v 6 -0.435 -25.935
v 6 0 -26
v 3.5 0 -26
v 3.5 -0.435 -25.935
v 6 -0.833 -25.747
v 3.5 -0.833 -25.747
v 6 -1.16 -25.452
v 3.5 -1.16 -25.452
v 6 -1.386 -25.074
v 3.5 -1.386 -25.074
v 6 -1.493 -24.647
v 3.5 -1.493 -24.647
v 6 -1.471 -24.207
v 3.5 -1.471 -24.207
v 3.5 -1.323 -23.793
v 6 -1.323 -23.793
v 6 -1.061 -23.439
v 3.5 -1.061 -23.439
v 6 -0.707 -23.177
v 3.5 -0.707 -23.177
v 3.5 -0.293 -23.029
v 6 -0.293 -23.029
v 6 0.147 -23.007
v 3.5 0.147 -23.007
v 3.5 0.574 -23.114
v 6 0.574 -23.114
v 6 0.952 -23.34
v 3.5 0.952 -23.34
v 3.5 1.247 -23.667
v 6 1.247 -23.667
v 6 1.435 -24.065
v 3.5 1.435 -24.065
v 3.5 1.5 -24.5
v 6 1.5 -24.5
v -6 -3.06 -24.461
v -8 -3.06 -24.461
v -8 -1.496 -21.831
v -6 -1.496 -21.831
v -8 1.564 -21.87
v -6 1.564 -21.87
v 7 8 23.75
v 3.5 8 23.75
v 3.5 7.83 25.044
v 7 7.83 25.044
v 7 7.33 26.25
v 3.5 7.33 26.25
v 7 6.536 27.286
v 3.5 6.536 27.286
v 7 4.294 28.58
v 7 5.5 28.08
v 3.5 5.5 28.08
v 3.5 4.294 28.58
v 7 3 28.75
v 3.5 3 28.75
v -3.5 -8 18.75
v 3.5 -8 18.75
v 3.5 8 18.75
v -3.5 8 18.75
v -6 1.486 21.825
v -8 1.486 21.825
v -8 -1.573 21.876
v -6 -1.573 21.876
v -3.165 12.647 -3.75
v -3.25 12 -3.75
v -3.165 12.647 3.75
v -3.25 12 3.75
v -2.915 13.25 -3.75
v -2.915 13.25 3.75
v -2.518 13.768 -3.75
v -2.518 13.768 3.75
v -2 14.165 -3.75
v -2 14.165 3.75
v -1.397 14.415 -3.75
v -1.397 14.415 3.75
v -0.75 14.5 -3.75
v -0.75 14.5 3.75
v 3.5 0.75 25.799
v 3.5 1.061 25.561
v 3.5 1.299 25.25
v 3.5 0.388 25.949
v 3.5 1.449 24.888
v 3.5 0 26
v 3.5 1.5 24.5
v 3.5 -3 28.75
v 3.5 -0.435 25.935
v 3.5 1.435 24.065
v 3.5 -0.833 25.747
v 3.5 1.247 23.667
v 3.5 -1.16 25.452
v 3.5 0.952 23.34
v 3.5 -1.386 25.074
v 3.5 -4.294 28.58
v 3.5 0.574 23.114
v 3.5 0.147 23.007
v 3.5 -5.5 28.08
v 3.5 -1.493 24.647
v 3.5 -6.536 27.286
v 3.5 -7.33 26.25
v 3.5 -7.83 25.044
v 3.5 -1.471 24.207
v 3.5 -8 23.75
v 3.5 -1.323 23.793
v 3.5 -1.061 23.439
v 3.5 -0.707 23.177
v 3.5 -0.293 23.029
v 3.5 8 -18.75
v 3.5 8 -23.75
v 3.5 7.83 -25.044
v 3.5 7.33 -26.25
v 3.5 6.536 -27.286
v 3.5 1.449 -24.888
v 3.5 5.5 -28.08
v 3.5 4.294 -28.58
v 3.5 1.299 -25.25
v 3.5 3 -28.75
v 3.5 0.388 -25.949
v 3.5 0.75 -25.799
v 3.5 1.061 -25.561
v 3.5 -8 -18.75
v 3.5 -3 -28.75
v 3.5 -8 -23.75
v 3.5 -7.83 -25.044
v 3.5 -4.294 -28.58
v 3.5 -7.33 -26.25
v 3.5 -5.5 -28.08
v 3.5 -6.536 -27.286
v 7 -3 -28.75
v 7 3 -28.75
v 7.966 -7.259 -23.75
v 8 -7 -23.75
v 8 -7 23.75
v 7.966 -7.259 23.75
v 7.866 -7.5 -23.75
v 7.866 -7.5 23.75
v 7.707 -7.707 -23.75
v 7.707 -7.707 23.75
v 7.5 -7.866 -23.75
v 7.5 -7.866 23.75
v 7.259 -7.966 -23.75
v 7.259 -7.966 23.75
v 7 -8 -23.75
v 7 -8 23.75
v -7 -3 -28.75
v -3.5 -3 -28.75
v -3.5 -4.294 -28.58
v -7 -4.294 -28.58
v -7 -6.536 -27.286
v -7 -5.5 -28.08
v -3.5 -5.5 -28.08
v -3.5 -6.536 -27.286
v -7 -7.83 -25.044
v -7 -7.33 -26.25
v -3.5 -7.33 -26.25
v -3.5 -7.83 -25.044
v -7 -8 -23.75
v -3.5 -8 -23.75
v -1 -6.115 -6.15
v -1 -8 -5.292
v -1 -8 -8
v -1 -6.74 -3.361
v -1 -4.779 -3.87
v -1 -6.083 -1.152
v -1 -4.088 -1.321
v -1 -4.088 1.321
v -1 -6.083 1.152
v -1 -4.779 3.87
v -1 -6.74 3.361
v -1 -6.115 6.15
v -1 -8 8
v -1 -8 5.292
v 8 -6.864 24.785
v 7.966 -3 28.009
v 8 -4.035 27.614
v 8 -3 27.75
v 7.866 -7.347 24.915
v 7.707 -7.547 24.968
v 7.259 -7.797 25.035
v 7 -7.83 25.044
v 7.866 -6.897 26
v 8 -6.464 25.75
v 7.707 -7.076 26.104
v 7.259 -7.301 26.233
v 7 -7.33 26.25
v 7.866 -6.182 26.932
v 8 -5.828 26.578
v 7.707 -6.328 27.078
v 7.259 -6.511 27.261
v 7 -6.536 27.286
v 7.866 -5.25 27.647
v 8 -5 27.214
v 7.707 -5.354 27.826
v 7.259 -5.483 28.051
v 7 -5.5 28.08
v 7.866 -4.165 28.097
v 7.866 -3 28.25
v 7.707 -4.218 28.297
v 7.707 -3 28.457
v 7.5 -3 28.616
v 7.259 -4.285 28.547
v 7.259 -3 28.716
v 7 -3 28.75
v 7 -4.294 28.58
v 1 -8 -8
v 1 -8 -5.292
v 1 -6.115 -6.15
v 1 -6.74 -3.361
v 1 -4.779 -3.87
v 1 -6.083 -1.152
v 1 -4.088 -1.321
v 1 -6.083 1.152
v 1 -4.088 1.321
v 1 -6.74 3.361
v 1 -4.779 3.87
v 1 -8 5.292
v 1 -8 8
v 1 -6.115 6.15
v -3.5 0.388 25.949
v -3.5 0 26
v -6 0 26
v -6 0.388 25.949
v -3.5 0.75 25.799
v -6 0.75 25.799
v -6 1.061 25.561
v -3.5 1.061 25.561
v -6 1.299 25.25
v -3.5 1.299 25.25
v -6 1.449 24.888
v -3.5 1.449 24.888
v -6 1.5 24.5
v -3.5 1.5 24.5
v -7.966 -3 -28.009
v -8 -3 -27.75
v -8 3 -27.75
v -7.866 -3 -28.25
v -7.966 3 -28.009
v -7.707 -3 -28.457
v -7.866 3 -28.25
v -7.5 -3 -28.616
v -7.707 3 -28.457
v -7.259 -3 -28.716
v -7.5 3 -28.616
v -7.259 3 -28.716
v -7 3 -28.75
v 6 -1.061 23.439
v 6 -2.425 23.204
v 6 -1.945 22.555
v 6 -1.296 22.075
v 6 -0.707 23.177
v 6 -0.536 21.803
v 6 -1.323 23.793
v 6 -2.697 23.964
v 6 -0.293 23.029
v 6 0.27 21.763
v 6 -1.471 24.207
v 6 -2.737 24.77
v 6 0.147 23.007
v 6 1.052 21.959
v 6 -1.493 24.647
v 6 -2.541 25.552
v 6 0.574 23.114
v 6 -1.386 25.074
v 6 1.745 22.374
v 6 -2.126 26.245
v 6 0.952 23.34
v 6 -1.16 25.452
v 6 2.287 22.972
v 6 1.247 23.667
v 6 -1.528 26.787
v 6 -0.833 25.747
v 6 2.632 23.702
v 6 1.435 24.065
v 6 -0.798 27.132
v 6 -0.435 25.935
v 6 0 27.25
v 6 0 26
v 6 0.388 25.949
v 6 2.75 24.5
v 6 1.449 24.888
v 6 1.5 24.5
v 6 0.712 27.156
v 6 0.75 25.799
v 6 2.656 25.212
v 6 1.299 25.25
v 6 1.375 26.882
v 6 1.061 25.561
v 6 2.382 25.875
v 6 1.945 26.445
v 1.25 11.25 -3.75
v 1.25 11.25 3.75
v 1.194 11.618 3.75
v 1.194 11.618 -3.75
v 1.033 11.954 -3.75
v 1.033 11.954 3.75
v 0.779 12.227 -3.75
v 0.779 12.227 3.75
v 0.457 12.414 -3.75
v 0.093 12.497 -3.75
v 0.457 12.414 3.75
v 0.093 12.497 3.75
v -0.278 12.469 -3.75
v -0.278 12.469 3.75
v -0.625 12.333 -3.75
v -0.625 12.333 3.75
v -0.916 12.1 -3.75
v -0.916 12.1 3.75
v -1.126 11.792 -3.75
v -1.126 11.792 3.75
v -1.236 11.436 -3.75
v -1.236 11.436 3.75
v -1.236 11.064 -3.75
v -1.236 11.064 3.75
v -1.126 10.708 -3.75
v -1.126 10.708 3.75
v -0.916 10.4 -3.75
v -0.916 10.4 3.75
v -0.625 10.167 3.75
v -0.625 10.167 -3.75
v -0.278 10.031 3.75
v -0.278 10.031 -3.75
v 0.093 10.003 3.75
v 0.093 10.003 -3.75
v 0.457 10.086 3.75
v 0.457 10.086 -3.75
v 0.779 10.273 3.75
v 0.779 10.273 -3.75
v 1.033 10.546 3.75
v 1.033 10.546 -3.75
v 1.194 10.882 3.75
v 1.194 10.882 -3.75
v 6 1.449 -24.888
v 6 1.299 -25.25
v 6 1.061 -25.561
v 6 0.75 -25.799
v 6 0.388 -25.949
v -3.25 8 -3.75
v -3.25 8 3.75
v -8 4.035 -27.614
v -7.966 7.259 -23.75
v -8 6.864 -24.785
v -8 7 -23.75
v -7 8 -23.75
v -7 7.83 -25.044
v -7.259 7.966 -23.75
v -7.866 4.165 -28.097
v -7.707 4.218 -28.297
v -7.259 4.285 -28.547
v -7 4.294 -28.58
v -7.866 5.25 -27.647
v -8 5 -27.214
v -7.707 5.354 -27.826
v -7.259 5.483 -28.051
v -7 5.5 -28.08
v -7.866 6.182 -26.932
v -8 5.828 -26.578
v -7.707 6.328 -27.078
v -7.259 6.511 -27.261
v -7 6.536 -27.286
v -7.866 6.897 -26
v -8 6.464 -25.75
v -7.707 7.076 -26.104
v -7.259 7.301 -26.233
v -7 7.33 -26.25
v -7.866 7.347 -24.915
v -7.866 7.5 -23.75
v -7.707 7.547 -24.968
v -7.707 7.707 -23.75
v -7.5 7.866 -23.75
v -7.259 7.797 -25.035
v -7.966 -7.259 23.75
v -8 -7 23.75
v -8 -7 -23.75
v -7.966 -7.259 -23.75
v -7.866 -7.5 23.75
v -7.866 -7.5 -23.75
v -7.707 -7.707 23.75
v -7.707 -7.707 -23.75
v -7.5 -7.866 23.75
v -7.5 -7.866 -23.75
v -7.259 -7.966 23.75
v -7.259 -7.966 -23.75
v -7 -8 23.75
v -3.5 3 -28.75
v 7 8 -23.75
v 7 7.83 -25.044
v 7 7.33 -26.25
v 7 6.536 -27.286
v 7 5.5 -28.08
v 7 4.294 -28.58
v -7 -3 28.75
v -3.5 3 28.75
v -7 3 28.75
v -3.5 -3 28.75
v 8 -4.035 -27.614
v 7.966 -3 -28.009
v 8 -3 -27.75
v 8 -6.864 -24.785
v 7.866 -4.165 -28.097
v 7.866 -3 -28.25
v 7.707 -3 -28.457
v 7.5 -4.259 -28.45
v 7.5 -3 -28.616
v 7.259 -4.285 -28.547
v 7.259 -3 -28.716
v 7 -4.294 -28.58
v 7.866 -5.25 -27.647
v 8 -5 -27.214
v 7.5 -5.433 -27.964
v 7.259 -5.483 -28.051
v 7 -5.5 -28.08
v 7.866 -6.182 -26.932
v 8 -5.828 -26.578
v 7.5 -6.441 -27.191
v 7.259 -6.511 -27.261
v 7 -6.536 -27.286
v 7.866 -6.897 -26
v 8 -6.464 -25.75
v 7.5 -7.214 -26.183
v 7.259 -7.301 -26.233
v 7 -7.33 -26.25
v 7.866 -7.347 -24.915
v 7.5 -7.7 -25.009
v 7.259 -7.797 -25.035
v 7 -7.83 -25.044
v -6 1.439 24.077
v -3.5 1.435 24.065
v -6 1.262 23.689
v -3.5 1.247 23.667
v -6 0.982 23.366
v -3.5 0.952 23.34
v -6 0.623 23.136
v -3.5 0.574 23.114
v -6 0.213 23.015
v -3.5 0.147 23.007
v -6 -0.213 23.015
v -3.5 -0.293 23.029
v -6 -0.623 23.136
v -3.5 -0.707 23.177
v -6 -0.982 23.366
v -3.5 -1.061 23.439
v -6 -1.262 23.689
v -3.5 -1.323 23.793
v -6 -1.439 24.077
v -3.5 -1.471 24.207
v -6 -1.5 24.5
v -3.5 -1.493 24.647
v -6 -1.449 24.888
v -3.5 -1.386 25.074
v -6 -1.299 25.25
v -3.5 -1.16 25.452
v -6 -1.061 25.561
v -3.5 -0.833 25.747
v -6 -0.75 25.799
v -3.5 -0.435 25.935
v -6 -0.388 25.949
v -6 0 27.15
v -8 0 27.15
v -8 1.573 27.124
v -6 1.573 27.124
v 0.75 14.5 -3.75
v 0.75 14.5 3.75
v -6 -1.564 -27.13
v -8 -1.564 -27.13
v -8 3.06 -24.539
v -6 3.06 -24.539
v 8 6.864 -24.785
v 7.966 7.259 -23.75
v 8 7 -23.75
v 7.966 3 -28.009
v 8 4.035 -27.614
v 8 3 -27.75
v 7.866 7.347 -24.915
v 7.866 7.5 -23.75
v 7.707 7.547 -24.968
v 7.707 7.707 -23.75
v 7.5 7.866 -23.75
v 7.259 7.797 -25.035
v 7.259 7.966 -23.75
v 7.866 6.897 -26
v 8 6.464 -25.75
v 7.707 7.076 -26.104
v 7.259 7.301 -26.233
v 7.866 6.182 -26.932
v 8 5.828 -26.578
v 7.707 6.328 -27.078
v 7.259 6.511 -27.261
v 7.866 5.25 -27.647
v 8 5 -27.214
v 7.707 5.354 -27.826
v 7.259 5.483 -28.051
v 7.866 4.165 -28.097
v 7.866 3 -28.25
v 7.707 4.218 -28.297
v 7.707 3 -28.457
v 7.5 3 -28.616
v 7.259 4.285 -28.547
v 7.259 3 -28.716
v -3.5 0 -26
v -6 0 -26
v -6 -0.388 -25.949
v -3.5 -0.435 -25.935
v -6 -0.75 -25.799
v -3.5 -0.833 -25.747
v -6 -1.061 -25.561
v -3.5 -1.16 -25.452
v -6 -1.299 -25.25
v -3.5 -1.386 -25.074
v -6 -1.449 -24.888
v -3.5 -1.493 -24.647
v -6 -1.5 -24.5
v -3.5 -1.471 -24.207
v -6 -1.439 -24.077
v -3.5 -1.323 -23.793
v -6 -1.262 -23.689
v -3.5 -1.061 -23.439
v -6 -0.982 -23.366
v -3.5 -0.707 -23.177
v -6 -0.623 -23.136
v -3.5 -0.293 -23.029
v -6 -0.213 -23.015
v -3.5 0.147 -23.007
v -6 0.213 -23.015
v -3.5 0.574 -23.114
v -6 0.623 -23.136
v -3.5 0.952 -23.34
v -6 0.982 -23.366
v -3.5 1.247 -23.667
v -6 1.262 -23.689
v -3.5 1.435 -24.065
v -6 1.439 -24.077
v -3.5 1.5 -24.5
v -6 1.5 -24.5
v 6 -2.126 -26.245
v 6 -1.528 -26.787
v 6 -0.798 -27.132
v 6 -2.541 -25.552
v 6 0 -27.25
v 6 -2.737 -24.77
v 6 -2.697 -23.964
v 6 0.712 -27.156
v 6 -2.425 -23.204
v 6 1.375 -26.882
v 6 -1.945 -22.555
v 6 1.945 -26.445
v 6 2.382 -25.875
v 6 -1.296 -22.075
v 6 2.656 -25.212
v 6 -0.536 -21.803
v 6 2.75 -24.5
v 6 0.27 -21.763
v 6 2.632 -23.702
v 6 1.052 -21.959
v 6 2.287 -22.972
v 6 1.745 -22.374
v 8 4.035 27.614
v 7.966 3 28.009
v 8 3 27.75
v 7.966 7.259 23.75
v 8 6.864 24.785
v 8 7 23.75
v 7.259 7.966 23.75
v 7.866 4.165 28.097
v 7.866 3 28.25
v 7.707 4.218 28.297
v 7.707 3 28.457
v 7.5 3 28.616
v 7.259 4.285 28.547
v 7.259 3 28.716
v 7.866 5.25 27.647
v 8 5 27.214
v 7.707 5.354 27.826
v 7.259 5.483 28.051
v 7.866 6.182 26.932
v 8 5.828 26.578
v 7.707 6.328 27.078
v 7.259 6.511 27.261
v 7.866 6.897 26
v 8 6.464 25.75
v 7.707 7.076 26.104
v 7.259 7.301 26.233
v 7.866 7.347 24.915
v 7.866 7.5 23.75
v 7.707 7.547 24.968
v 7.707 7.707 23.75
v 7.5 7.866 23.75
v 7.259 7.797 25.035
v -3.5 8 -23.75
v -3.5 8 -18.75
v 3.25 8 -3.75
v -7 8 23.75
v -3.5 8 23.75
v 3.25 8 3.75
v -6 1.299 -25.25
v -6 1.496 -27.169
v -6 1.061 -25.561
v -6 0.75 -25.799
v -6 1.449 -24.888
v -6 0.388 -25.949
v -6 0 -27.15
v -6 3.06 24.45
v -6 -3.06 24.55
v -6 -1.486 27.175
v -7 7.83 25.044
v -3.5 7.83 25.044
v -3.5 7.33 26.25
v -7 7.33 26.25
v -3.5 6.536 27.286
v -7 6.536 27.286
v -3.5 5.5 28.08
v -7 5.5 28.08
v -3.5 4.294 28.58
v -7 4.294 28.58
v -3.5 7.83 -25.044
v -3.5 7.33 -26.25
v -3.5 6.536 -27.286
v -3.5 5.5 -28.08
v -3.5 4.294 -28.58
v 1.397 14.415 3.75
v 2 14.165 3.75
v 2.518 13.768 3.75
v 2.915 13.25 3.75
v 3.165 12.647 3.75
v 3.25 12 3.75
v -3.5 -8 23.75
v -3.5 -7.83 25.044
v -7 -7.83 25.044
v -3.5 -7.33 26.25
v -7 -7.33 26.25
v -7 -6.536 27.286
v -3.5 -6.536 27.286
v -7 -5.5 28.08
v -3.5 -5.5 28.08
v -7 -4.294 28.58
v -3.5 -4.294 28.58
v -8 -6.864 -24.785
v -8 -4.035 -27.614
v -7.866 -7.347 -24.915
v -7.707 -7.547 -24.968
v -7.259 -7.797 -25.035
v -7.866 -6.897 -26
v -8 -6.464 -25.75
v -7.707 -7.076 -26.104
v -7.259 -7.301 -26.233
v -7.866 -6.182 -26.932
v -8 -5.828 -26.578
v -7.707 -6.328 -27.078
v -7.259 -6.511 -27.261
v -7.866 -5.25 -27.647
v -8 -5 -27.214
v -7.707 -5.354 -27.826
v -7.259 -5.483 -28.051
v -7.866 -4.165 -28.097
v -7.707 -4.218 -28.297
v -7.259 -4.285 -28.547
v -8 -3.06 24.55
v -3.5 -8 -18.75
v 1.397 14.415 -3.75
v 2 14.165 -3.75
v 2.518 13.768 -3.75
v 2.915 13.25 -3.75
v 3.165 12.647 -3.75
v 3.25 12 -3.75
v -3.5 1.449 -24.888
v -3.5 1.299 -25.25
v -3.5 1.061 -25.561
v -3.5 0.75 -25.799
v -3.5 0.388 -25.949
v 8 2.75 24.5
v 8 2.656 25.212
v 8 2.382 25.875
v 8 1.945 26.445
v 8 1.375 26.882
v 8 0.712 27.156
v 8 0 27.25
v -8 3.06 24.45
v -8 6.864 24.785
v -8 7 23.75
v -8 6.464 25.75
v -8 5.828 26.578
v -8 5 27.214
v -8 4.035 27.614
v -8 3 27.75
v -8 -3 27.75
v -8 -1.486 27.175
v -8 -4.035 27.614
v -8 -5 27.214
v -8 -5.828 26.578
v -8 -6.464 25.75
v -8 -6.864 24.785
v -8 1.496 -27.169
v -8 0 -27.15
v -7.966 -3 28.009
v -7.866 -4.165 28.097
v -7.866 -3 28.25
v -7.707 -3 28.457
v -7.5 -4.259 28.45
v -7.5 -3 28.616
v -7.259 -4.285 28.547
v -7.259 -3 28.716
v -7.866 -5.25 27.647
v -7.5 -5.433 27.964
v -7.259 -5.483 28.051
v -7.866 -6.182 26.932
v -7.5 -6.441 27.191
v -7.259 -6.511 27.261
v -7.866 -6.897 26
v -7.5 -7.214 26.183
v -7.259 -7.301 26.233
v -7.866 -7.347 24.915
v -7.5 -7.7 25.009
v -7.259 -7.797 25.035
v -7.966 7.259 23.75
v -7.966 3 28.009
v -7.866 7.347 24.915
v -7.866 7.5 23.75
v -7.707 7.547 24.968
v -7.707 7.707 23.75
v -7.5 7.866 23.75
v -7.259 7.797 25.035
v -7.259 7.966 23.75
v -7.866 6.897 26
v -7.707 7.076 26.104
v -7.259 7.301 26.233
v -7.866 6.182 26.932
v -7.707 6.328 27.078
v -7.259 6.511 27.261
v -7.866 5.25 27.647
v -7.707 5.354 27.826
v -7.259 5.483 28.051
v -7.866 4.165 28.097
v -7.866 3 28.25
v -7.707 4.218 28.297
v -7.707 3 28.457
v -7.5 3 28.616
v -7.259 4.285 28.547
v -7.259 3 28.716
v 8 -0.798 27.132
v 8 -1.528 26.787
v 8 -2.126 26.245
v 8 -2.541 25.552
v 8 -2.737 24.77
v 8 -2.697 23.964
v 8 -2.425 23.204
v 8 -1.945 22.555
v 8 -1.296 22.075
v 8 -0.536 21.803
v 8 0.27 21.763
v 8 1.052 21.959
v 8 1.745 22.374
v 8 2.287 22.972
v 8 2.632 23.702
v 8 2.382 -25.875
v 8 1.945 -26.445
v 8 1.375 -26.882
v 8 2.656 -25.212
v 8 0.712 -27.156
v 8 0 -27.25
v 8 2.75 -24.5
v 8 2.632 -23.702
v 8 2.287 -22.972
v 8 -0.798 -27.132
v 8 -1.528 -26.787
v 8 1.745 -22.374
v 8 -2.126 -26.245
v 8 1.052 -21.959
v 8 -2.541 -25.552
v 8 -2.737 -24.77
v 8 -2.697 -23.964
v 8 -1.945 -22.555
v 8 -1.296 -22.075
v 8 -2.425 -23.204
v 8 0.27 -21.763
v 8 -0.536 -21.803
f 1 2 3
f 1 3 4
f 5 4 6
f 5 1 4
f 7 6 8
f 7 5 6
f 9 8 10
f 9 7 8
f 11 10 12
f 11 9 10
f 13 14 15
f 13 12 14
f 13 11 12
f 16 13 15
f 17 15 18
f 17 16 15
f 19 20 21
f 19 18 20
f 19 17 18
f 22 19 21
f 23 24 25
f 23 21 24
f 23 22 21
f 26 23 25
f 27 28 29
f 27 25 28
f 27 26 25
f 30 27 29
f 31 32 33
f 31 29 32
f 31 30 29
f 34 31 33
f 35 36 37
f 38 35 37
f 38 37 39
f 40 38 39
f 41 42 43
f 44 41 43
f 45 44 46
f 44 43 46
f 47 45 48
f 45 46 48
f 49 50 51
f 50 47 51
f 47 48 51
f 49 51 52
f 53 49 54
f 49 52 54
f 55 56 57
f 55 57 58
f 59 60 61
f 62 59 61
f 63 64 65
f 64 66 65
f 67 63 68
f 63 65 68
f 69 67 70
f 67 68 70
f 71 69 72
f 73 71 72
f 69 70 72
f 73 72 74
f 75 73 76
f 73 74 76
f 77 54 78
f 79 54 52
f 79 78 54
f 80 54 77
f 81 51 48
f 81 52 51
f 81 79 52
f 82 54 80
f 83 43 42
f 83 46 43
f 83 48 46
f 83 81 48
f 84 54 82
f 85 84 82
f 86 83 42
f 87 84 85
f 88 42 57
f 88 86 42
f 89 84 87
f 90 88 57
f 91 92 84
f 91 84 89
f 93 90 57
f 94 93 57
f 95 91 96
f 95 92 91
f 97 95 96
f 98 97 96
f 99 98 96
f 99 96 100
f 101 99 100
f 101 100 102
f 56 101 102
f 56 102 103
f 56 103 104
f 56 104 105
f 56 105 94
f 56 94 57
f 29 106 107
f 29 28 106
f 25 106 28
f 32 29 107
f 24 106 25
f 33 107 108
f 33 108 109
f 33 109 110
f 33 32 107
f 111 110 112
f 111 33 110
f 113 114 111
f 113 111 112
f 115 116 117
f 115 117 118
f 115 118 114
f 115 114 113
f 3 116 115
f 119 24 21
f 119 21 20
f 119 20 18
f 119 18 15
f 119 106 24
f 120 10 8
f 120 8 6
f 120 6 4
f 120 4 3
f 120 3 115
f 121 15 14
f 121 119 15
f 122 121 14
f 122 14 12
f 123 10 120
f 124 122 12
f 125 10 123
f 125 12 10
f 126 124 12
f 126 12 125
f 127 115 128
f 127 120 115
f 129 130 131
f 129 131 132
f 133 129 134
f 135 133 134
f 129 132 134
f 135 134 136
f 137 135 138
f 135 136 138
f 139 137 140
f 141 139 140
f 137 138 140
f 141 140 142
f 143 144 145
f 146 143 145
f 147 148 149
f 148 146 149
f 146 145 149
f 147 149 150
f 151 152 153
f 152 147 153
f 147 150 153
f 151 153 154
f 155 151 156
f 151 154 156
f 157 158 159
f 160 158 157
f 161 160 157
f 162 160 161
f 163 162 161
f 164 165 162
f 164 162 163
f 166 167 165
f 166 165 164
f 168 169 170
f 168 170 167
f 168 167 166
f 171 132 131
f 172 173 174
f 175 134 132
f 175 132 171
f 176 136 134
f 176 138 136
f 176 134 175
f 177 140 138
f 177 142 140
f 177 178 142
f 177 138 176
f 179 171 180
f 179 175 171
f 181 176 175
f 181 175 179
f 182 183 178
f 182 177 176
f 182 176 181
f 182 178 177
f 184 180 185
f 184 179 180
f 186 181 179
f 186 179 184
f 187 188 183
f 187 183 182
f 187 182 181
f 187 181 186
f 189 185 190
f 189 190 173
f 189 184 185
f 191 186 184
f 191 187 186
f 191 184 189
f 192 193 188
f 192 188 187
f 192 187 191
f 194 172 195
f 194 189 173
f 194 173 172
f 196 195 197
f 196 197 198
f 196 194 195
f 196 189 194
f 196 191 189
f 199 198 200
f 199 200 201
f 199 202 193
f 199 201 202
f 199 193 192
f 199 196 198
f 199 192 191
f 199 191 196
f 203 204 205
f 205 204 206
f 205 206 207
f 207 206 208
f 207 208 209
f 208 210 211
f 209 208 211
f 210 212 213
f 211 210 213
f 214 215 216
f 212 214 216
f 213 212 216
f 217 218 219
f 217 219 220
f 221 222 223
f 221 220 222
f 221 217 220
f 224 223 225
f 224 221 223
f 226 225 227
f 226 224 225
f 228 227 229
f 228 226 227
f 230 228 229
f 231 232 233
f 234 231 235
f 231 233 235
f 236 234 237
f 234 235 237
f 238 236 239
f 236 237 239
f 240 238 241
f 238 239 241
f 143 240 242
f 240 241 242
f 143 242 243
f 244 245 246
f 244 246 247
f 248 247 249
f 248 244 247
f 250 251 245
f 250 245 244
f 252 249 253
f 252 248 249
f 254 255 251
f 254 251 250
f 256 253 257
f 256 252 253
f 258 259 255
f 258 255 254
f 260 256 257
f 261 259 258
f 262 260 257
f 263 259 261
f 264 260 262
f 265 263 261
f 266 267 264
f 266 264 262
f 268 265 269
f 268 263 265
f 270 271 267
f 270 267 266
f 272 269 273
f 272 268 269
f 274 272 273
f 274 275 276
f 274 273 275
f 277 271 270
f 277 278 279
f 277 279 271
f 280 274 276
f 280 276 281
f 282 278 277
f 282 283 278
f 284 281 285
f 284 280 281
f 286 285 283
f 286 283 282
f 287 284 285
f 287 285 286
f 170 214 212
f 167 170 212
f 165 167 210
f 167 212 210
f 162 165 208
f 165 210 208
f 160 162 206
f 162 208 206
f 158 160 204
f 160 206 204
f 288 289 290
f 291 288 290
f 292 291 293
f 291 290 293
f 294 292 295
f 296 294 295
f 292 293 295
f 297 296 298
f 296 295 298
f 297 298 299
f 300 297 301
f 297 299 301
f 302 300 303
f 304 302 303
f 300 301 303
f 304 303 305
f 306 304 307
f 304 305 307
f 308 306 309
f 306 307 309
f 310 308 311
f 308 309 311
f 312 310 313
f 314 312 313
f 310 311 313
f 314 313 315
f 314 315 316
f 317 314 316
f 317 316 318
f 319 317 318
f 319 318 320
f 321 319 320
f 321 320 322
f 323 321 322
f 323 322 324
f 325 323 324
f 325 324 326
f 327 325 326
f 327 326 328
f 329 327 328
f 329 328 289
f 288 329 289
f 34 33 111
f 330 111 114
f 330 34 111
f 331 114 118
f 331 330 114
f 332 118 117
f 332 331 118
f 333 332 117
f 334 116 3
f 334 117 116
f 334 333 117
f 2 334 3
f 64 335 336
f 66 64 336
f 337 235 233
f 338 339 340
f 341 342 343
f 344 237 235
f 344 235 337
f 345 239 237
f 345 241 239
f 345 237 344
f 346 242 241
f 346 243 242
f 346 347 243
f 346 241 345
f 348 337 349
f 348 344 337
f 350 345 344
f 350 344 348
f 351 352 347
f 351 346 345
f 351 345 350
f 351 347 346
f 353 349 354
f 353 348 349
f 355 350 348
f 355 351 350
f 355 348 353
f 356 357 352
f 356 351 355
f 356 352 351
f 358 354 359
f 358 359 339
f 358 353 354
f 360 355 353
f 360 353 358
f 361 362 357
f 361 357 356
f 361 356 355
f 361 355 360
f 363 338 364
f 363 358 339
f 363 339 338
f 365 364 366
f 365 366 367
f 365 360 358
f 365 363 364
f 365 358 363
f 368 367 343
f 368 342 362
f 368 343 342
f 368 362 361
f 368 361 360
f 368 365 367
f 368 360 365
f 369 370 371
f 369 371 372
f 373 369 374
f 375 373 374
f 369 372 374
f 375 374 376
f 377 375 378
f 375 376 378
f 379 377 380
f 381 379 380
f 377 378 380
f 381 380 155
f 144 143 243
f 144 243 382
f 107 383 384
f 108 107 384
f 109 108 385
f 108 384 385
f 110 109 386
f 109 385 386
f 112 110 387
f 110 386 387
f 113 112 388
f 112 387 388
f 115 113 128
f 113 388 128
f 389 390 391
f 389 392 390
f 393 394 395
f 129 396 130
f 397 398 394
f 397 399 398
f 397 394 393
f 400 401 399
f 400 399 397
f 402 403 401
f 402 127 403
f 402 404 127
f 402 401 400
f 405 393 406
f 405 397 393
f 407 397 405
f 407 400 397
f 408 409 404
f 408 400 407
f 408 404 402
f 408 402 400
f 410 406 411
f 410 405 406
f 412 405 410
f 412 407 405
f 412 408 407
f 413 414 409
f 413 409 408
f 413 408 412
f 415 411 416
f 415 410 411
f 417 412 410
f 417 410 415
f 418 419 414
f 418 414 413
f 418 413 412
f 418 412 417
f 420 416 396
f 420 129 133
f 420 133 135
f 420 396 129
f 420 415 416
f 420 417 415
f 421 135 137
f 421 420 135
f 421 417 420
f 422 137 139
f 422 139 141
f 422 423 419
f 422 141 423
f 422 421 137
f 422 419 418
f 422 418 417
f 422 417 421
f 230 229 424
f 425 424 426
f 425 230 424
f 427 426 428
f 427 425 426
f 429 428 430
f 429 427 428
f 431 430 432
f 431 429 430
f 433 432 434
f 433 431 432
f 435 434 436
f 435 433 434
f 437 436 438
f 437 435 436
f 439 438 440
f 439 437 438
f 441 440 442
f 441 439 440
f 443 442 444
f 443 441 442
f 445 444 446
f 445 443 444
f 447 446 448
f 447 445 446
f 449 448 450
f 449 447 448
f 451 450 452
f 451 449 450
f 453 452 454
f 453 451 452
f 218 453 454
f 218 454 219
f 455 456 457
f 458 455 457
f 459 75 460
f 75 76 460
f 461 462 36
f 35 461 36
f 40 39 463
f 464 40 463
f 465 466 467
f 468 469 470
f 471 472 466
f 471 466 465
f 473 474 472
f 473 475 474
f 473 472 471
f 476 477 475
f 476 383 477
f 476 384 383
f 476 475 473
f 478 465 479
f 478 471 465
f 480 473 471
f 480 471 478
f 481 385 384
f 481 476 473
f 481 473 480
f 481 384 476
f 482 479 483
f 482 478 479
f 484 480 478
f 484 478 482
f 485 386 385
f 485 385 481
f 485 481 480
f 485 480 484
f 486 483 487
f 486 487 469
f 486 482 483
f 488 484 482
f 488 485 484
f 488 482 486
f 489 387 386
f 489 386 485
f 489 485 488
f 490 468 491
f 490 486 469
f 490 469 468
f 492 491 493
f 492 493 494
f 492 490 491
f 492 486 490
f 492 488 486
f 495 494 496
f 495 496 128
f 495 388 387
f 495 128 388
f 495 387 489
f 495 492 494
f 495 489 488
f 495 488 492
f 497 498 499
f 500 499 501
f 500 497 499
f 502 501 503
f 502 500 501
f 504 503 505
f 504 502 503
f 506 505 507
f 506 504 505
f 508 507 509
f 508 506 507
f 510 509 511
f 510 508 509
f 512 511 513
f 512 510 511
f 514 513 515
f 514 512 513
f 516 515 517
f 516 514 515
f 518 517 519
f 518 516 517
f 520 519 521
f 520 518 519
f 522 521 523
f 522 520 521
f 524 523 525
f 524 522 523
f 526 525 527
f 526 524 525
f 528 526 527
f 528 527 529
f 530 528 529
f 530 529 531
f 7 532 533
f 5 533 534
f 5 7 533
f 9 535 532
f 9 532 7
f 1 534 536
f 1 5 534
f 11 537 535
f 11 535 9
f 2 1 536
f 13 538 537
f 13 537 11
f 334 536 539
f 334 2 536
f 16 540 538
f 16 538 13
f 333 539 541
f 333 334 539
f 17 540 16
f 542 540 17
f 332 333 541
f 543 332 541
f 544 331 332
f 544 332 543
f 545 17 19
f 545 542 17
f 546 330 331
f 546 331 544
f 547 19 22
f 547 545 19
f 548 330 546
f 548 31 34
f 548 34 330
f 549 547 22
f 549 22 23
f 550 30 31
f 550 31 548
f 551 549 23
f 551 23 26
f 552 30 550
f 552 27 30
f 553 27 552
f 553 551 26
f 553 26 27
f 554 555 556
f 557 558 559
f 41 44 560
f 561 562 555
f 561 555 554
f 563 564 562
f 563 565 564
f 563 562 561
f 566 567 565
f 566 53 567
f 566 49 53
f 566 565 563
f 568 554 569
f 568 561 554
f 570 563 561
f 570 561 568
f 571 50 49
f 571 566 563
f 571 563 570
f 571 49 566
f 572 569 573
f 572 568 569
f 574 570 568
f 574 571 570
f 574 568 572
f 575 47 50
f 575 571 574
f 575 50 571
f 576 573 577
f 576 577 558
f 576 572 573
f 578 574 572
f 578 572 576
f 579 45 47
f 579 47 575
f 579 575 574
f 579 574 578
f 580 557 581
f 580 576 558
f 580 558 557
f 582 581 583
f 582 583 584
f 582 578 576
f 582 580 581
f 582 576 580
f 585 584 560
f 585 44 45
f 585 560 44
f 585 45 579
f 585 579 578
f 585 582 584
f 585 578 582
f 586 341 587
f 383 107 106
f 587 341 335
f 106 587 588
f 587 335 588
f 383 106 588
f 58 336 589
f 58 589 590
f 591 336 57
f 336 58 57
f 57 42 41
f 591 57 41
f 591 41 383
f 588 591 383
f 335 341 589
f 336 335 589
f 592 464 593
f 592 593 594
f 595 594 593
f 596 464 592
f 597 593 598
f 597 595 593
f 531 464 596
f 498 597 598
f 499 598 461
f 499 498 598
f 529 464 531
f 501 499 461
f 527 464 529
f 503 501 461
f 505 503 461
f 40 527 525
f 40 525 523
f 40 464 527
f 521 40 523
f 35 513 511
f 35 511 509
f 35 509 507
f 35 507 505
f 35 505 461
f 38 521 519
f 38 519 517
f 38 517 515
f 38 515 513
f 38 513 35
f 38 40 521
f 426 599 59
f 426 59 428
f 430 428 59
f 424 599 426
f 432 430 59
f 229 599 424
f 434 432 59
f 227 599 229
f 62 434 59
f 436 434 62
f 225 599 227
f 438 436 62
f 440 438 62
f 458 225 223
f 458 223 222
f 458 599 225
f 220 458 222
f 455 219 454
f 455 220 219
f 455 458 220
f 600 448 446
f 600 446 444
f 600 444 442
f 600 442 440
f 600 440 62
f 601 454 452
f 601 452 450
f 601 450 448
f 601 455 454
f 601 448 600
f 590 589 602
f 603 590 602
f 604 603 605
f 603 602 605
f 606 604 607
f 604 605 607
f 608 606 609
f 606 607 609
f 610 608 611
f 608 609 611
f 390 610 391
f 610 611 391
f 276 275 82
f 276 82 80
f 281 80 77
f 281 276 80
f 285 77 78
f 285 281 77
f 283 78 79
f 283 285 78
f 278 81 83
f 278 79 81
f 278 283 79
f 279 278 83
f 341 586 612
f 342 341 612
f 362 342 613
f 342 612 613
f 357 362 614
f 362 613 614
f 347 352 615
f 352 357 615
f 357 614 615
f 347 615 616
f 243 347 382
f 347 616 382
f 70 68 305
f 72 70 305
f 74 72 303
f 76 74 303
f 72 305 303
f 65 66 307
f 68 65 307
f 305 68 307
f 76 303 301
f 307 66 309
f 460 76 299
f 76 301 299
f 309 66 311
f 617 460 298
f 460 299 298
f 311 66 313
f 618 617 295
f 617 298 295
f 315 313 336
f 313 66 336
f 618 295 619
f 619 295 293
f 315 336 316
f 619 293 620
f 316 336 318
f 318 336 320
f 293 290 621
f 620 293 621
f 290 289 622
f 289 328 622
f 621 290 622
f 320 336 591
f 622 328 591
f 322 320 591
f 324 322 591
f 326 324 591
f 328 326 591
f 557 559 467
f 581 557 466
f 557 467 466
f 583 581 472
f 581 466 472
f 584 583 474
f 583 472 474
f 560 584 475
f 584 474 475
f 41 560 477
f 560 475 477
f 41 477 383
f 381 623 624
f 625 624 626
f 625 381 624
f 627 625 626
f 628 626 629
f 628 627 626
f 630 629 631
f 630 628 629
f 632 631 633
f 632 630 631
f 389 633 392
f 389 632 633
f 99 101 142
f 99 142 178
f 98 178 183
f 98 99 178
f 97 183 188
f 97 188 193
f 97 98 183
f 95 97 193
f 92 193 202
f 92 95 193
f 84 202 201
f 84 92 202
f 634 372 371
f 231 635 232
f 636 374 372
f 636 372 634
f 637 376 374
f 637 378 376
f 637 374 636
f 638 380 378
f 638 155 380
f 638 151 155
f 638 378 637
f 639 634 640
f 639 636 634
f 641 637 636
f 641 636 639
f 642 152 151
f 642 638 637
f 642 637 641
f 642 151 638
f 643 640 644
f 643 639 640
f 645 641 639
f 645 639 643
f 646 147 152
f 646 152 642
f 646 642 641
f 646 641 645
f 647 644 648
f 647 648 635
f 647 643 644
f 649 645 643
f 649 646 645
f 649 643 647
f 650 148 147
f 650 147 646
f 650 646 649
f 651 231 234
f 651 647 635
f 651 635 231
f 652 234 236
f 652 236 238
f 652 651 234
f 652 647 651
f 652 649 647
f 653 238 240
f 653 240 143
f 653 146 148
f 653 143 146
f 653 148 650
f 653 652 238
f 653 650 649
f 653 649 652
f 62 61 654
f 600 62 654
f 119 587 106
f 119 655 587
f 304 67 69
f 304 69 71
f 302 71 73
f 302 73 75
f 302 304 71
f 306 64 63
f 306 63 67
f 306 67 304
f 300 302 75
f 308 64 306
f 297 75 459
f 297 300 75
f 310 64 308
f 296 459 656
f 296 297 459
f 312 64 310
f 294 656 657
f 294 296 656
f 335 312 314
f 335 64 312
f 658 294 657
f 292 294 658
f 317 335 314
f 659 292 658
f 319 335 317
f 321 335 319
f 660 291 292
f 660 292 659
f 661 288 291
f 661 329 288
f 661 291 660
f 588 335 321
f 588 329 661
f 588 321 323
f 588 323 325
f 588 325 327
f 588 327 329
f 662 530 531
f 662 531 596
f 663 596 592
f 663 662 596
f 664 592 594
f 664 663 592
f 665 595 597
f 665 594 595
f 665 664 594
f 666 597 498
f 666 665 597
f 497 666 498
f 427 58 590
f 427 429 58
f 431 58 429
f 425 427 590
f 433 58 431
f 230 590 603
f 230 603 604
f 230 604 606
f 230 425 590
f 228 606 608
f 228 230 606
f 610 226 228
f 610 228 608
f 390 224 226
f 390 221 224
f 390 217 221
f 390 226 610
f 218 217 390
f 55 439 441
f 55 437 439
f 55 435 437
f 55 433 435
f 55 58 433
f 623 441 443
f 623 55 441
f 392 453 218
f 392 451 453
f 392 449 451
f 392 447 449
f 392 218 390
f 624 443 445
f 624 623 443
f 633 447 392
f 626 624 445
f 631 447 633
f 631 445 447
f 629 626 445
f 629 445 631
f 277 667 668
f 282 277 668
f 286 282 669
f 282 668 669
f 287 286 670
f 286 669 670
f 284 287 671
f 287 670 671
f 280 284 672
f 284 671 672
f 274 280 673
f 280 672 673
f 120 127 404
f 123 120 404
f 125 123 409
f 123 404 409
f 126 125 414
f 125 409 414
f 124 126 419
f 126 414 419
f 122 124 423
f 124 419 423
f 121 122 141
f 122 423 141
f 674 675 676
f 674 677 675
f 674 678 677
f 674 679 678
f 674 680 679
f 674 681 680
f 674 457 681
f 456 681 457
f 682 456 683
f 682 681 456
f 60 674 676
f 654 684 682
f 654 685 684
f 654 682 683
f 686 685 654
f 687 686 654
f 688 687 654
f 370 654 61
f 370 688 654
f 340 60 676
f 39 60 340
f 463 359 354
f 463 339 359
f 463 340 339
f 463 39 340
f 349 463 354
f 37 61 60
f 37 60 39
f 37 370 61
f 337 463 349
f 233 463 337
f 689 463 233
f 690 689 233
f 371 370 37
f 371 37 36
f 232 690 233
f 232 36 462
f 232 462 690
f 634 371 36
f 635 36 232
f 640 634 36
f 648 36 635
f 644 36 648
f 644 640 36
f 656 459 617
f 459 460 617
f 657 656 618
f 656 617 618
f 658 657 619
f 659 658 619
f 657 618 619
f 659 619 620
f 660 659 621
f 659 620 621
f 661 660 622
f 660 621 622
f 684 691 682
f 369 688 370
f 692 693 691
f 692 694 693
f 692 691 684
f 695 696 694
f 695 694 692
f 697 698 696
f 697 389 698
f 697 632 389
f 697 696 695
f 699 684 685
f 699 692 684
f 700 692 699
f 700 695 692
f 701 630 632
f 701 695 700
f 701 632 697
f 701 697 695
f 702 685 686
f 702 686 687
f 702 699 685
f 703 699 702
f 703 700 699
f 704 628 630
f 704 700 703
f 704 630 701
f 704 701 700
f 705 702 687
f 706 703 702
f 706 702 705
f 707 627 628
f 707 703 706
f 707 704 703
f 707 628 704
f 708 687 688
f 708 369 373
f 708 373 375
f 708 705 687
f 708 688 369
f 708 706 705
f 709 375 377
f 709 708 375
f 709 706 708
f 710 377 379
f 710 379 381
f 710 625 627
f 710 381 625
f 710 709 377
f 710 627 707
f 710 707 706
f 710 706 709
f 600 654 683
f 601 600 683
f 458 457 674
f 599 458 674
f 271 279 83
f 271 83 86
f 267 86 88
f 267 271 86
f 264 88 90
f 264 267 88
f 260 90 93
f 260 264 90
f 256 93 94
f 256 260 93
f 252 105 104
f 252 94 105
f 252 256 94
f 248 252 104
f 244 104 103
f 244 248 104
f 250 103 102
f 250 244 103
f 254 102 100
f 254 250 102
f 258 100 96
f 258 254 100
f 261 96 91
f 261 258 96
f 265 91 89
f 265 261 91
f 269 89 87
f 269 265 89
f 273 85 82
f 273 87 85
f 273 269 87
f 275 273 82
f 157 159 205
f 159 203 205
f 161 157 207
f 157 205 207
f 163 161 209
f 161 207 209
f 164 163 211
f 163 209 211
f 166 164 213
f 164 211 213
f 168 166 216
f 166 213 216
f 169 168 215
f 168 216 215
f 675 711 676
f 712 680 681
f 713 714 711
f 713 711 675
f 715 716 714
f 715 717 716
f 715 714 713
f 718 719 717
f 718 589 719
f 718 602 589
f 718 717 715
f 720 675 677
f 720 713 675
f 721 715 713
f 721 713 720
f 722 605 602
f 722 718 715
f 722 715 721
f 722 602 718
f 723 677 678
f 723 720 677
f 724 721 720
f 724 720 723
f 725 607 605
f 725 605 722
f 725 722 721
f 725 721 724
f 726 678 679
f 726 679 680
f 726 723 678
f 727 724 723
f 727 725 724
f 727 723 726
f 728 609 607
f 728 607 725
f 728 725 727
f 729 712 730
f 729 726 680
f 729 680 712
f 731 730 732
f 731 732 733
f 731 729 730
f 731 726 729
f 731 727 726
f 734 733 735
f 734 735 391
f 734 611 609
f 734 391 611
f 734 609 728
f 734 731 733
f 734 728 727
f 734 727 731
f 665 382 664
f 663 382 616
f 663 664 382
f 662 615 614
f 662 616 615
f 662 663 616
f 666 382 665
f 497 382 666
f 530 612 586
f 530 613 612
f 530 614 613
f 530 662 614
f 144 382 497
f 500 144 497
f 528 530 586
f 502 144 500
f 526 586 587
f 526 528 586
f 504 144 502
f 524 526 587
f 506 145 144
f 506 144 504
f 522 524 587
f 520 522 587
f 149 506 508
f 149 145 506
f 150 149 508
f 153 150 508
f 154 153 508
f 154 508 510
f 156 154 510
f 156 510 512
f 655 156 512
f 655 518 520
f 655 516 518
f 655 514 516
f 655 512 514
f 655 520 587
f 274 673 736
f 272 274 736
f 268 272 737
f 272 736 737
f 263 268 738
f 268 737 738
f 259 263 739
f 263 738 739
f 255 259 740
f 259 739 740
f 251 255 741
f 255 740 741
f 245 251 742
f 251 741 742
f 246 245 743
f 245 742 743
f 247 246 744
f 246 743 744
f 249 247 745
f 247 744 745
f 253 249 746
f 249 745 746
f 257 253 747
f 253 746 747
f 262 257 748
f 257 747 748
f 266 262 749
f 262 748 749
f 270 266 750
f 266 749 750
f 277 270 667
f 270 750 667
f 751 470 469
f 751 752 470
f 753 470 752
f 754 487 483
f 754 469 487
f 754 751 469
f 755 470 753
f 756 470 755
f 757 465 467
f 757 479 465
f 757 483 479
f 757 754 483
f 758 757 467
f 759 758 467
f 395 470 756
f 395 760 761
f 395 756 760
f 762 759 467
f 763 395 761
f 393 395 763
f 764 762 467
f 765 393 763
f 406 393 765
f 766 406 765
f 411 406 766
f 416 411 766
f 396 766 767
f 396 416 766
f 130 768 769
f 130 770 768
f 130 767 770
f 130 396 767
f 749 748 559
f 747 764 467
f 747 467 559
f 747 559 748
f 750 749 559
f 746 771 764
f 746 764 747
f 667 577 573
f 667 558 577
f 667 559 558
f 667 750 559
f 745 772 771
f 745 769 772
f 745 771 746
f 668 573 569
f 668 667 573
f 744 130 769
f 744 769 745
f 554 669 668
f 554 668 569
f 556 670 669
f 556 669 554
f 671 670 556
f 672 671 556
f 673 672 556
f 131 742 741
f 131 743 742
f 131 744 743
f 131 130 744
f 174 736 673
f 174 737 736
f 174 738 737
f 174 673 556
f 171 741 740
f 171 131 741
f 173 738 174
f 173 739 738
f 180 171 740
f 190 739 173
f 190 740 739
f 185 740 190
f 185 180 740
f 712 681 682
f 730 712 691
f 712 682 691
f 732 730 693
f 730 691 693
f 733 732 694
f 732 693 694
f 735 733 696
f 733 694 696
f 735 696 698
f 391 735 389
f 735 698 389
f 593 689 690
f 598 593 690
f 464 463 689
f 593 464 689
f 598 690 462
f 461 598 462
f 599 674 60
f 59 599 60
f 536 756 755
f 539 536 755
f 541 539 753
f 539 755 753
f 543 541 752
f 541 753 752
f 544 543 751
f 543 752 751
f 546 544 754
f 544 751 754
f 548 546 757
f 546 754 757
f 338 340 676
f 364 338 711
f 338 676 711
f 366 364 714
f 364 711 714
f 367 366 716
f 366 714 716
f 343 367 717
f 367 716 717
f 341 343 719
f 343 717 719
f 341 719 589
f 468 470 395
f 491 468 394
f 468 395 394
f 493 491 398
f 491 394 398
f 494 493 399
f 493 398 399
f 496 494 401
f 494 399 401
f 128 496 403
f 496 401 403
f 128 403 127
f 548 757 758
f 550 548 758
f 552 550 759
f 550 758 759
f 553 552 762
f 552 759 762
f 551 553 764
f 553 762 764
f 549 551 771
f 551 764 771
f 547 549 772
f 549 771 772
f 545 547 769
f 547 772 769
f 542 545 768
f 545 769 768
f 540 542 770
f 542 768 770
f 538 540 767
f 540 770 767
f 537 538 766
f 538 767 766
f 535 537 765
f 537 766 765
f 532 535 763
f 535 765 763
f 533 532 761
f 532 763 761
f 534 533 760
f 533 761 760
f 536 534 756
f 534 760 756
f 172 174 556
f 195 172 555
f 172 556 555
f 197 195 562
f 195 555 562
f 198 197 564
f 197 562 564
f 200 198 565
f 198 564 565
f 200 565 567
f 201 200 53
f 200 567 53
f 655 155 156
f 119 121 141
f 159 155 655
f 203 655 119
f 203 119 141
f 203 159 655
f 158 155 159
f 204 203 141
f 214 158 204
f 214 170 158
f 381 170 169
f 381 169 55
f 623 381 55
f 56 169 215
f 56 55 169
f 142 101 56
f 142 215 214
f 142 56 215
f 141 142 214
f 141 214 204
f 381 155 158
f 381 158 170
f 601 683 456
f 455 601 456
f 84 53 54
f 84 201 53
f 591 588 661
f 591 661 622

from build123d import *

# Parameters (mm, degrees)
F0_W      = 6.5
F0_H      = 7.5
F1_DEPTH  = 8
F3_DEPTH  = 2
F4_DEPTH  = 25
F6_DEPTH  = 2
F7_R      = 5
F8_R      = 5
F9_R      = 1
F10_DEPTH = 14.5
F11_R     = 1.25
F12_DEPTH = 32.501
F13_R     = 2.5
F14_R     = 1.25
F15_DEPTH = 32.501
F17_DEPTH = 1


with BuildPart() as f1:
    # F0 (on Front) → F1 (new body, symmetric)
    with BuildSketch(Plane.XZ):
        Polygon((3.5, -28.75), (8, -28.75), (8, 28.75), (3.5, 28.75), (3.5, 18.75), (-3.5, 18.75), (-3.5, 28.75), (-8, 28.75), (-8, -28.75), (-3.5, -28.75), (-3.5, -18.75), (3.5, -18.75), align=None)
        Rectangle(F0_W, F0_H, mode=Mode.SUBTRACT)
    extrude(amount=F1_DEPTH, both=True)

    # F2 (on face) → F3 (cut)
    with BuildSketch(Plane.YZ.offset(8)):
        with BuildLine():
            ThreePointArc((2.75, 24.5), (1.9445436483, 26.4445436483), (0, 27.25))
            ThreePointArc((0, 27.25), (-1.9445436483, 22.5554563517), (2.75, 24.5))
        make_face()
        with BuildLine():
            ThreePointArc((1.5, 24.5), (-1.0606601718, 23.4393398282), (0, 26))
            ThreePointArc((0, 26), (1.0606601718, 25.5606601718), (1.5, 24.5))
        make_face(mode=Mode.SUBTRACT)
        with BuildLine():
            ThreePointArc((2.75, -24.5), (-1.9445436483, -22.5554563517), (0, -27.25))
            ThreePointArc((0, -27.25), (1.9445436483, -26.4445436483), (2.75, -24.5))
        make_face()
        with BuildLine():
            ThreePointArc((1.5, -24.5), (1.0606601718, -25.5606601718), (0, -26))
            ThreePointArc((0, -26), (-1.0606601718, -23.4393398282), (1.5, -24.5))
        make_face(mode=Mode.SUBTRACT)
    extrude(amount=-F3_DEPTH, mode=Mode.SUBTRACT)

    # F4 (cut): faces of the model
    f4_faces = [f1.faces().sort_by_distance(p)[0] for p in [
        (8, 0, 24.5),
        (8, 0, -24.5),
    ]]
    extrude(f4_faces, amount=-F4_DEPTH, mode=Mode.SUBTRACT)

    # F5 (on face) → F6 (cut)
    with BuildSketch(Plane(origin=(-8, 0, 0), x_dir=(0, -1, 0), z_dir=(-1, 0, 0))):
        Polygon((1.4860554785, 27.1748780249), (0, 27.1503606325), (-1.5734845824, 27.1244008083), (-3.0595400608, 24.4495227834), (-1.4860554785, 21.8251219751), (1.5734845824, 21.8755991917), (3.0595400608, 24.5504772166), align=None)
        with BuildLine():
            ThreePointArc((1.5, 24.5), (-1.0606601718, 23.4393398282), (0, 26))
            ThreePointArc((0, 26), (1.0606601718, 25.5606601718), (1.5, 24.5))
        make_face(mode=Mode.SUBTRACT)
        Polygon((-1.4958462814, -27.1694151487), (0, -27.1502182166), (1.5638581913, -27.1301484541), (3.0597044727, -24.4607333055), (1.4958462814, -21.8305848513), (-1.5638581913, -21.8698515459), (-3.0597044727, -24.5392666945), align=None)
        with BuildLine():
            ThreePointArc((1.5, -24.5), (1.0606601718, -25.5606601718), (0, -26))
            ThreePointArc((0, -26), (-1.0606601718, -23.4393398282), (1.5, -24.5))
        make_face(mode=Mode.SUBTRACT)
    extrude(amount=-F6_DEPTH, mode=Mode.SUBTRACT)

    # F7
    f7_edges = [f1.edges().sort_by_distance(p)[0] for p in [
        (5.75, -8, 28.75),
        (5.75, 8, 28.75),
        (-5.75, 8, 28.75),
        (-5.75, -8, 28.75),
    ]]
    fillet(f7_edges, radius=F7_R)

    # F8
    f8_edges = [f1.edges().sort_by_distance(p)[0] for p in [
        (5.75, 8, -28.75),
        (-5.75, 8, -28.75),
        (5.75, -8, -28.75),
        (-5.75, -8, -28.75),
    ]]
    fillet(f8_edges, radius=F8_R)

    # F9
    f9_edges = [f1.edges().sort_by_distance(p)[0] for p in [
        (-8, -8, 0),
        (8, -8, 0),
        (8, 8, 0),
        (-8, 8, 0),
    ]]
    fillet(f9_edges, radius=F9_R)

    # F0 (on Front) → F10 (join, symmetric)
    with BuildSketch(Plane.XZ):
        Rectangle(F0_W, F0_H)
    extrude(amount=F10_DEPTH, both=True)

    # F11 (on face) → F12 (cut, through all)
    with BuildSketch(Plane.XY.offset(3.75)):
        with Locations((0, 11.25)):
            Circle(F11_R)
        with Locations((0, -11.25)):
            Circle(F11_R)
    extrude(amount=-F12_DEPTH, mode=Mode.SUBTRACT)

    # F13
    f13_edges = [f1.edges().sort_by_distance(p)[0] for p in [
        (-3.25, 14.5, 0),
        (3.25, 14.5, 0),
        (-3.25, -14.5, 0),
        (3.25, -14.5, 0),
    ]]
    fillet(f13_edges, radius=F13_R)

    # F14 (on face) → F15 (cut, through all)
    with BuildSketch(Plane.XY.offset(3.75)):
        with BuildLine():
            ThreePointArc((-3.25, -12), (-2.517766953, -13.767766953), (-0.75, -14.5))
            Line((-0.75, -14.5), (0.75, -14.5))
            ThreePointArc((0.75, -14.5), (2.517766953, -13.767766953), (3.25, -12))
            Line((3.25, -12), (3.25, -8))
            Line((3.25, -8), (-3.25, -8))
            Line((-3.25, -8), (-3.25, -12))
        make_face()
        with Locations((0, -11.25)):
            Circle(F14_R, mode=Mode.SUBTRACT)
    extrude(amount=-F15_DEPTH, mode=Mode.SUBTRACT)

    # F16 (on Right) → F17 (cut, symmetric)
    with BuildSketch(Plane.YZ):
        with BuildLine():
            ThreePointArc((-8, -8), (-4, 0), (-8, 8))
            Line((-8, 8), (-8, 5.2915026221))
            ThreePointArc((-8, 5.2915026221), (-6, 0), (-8, -5.2915026221))
            Line((-8, -5.2915026221), (-8, -8))
        make_face()
    extrude(amount=F17_DEPTH, both=True, mode=Mode.SUBTRACT)


solid = f1.part
